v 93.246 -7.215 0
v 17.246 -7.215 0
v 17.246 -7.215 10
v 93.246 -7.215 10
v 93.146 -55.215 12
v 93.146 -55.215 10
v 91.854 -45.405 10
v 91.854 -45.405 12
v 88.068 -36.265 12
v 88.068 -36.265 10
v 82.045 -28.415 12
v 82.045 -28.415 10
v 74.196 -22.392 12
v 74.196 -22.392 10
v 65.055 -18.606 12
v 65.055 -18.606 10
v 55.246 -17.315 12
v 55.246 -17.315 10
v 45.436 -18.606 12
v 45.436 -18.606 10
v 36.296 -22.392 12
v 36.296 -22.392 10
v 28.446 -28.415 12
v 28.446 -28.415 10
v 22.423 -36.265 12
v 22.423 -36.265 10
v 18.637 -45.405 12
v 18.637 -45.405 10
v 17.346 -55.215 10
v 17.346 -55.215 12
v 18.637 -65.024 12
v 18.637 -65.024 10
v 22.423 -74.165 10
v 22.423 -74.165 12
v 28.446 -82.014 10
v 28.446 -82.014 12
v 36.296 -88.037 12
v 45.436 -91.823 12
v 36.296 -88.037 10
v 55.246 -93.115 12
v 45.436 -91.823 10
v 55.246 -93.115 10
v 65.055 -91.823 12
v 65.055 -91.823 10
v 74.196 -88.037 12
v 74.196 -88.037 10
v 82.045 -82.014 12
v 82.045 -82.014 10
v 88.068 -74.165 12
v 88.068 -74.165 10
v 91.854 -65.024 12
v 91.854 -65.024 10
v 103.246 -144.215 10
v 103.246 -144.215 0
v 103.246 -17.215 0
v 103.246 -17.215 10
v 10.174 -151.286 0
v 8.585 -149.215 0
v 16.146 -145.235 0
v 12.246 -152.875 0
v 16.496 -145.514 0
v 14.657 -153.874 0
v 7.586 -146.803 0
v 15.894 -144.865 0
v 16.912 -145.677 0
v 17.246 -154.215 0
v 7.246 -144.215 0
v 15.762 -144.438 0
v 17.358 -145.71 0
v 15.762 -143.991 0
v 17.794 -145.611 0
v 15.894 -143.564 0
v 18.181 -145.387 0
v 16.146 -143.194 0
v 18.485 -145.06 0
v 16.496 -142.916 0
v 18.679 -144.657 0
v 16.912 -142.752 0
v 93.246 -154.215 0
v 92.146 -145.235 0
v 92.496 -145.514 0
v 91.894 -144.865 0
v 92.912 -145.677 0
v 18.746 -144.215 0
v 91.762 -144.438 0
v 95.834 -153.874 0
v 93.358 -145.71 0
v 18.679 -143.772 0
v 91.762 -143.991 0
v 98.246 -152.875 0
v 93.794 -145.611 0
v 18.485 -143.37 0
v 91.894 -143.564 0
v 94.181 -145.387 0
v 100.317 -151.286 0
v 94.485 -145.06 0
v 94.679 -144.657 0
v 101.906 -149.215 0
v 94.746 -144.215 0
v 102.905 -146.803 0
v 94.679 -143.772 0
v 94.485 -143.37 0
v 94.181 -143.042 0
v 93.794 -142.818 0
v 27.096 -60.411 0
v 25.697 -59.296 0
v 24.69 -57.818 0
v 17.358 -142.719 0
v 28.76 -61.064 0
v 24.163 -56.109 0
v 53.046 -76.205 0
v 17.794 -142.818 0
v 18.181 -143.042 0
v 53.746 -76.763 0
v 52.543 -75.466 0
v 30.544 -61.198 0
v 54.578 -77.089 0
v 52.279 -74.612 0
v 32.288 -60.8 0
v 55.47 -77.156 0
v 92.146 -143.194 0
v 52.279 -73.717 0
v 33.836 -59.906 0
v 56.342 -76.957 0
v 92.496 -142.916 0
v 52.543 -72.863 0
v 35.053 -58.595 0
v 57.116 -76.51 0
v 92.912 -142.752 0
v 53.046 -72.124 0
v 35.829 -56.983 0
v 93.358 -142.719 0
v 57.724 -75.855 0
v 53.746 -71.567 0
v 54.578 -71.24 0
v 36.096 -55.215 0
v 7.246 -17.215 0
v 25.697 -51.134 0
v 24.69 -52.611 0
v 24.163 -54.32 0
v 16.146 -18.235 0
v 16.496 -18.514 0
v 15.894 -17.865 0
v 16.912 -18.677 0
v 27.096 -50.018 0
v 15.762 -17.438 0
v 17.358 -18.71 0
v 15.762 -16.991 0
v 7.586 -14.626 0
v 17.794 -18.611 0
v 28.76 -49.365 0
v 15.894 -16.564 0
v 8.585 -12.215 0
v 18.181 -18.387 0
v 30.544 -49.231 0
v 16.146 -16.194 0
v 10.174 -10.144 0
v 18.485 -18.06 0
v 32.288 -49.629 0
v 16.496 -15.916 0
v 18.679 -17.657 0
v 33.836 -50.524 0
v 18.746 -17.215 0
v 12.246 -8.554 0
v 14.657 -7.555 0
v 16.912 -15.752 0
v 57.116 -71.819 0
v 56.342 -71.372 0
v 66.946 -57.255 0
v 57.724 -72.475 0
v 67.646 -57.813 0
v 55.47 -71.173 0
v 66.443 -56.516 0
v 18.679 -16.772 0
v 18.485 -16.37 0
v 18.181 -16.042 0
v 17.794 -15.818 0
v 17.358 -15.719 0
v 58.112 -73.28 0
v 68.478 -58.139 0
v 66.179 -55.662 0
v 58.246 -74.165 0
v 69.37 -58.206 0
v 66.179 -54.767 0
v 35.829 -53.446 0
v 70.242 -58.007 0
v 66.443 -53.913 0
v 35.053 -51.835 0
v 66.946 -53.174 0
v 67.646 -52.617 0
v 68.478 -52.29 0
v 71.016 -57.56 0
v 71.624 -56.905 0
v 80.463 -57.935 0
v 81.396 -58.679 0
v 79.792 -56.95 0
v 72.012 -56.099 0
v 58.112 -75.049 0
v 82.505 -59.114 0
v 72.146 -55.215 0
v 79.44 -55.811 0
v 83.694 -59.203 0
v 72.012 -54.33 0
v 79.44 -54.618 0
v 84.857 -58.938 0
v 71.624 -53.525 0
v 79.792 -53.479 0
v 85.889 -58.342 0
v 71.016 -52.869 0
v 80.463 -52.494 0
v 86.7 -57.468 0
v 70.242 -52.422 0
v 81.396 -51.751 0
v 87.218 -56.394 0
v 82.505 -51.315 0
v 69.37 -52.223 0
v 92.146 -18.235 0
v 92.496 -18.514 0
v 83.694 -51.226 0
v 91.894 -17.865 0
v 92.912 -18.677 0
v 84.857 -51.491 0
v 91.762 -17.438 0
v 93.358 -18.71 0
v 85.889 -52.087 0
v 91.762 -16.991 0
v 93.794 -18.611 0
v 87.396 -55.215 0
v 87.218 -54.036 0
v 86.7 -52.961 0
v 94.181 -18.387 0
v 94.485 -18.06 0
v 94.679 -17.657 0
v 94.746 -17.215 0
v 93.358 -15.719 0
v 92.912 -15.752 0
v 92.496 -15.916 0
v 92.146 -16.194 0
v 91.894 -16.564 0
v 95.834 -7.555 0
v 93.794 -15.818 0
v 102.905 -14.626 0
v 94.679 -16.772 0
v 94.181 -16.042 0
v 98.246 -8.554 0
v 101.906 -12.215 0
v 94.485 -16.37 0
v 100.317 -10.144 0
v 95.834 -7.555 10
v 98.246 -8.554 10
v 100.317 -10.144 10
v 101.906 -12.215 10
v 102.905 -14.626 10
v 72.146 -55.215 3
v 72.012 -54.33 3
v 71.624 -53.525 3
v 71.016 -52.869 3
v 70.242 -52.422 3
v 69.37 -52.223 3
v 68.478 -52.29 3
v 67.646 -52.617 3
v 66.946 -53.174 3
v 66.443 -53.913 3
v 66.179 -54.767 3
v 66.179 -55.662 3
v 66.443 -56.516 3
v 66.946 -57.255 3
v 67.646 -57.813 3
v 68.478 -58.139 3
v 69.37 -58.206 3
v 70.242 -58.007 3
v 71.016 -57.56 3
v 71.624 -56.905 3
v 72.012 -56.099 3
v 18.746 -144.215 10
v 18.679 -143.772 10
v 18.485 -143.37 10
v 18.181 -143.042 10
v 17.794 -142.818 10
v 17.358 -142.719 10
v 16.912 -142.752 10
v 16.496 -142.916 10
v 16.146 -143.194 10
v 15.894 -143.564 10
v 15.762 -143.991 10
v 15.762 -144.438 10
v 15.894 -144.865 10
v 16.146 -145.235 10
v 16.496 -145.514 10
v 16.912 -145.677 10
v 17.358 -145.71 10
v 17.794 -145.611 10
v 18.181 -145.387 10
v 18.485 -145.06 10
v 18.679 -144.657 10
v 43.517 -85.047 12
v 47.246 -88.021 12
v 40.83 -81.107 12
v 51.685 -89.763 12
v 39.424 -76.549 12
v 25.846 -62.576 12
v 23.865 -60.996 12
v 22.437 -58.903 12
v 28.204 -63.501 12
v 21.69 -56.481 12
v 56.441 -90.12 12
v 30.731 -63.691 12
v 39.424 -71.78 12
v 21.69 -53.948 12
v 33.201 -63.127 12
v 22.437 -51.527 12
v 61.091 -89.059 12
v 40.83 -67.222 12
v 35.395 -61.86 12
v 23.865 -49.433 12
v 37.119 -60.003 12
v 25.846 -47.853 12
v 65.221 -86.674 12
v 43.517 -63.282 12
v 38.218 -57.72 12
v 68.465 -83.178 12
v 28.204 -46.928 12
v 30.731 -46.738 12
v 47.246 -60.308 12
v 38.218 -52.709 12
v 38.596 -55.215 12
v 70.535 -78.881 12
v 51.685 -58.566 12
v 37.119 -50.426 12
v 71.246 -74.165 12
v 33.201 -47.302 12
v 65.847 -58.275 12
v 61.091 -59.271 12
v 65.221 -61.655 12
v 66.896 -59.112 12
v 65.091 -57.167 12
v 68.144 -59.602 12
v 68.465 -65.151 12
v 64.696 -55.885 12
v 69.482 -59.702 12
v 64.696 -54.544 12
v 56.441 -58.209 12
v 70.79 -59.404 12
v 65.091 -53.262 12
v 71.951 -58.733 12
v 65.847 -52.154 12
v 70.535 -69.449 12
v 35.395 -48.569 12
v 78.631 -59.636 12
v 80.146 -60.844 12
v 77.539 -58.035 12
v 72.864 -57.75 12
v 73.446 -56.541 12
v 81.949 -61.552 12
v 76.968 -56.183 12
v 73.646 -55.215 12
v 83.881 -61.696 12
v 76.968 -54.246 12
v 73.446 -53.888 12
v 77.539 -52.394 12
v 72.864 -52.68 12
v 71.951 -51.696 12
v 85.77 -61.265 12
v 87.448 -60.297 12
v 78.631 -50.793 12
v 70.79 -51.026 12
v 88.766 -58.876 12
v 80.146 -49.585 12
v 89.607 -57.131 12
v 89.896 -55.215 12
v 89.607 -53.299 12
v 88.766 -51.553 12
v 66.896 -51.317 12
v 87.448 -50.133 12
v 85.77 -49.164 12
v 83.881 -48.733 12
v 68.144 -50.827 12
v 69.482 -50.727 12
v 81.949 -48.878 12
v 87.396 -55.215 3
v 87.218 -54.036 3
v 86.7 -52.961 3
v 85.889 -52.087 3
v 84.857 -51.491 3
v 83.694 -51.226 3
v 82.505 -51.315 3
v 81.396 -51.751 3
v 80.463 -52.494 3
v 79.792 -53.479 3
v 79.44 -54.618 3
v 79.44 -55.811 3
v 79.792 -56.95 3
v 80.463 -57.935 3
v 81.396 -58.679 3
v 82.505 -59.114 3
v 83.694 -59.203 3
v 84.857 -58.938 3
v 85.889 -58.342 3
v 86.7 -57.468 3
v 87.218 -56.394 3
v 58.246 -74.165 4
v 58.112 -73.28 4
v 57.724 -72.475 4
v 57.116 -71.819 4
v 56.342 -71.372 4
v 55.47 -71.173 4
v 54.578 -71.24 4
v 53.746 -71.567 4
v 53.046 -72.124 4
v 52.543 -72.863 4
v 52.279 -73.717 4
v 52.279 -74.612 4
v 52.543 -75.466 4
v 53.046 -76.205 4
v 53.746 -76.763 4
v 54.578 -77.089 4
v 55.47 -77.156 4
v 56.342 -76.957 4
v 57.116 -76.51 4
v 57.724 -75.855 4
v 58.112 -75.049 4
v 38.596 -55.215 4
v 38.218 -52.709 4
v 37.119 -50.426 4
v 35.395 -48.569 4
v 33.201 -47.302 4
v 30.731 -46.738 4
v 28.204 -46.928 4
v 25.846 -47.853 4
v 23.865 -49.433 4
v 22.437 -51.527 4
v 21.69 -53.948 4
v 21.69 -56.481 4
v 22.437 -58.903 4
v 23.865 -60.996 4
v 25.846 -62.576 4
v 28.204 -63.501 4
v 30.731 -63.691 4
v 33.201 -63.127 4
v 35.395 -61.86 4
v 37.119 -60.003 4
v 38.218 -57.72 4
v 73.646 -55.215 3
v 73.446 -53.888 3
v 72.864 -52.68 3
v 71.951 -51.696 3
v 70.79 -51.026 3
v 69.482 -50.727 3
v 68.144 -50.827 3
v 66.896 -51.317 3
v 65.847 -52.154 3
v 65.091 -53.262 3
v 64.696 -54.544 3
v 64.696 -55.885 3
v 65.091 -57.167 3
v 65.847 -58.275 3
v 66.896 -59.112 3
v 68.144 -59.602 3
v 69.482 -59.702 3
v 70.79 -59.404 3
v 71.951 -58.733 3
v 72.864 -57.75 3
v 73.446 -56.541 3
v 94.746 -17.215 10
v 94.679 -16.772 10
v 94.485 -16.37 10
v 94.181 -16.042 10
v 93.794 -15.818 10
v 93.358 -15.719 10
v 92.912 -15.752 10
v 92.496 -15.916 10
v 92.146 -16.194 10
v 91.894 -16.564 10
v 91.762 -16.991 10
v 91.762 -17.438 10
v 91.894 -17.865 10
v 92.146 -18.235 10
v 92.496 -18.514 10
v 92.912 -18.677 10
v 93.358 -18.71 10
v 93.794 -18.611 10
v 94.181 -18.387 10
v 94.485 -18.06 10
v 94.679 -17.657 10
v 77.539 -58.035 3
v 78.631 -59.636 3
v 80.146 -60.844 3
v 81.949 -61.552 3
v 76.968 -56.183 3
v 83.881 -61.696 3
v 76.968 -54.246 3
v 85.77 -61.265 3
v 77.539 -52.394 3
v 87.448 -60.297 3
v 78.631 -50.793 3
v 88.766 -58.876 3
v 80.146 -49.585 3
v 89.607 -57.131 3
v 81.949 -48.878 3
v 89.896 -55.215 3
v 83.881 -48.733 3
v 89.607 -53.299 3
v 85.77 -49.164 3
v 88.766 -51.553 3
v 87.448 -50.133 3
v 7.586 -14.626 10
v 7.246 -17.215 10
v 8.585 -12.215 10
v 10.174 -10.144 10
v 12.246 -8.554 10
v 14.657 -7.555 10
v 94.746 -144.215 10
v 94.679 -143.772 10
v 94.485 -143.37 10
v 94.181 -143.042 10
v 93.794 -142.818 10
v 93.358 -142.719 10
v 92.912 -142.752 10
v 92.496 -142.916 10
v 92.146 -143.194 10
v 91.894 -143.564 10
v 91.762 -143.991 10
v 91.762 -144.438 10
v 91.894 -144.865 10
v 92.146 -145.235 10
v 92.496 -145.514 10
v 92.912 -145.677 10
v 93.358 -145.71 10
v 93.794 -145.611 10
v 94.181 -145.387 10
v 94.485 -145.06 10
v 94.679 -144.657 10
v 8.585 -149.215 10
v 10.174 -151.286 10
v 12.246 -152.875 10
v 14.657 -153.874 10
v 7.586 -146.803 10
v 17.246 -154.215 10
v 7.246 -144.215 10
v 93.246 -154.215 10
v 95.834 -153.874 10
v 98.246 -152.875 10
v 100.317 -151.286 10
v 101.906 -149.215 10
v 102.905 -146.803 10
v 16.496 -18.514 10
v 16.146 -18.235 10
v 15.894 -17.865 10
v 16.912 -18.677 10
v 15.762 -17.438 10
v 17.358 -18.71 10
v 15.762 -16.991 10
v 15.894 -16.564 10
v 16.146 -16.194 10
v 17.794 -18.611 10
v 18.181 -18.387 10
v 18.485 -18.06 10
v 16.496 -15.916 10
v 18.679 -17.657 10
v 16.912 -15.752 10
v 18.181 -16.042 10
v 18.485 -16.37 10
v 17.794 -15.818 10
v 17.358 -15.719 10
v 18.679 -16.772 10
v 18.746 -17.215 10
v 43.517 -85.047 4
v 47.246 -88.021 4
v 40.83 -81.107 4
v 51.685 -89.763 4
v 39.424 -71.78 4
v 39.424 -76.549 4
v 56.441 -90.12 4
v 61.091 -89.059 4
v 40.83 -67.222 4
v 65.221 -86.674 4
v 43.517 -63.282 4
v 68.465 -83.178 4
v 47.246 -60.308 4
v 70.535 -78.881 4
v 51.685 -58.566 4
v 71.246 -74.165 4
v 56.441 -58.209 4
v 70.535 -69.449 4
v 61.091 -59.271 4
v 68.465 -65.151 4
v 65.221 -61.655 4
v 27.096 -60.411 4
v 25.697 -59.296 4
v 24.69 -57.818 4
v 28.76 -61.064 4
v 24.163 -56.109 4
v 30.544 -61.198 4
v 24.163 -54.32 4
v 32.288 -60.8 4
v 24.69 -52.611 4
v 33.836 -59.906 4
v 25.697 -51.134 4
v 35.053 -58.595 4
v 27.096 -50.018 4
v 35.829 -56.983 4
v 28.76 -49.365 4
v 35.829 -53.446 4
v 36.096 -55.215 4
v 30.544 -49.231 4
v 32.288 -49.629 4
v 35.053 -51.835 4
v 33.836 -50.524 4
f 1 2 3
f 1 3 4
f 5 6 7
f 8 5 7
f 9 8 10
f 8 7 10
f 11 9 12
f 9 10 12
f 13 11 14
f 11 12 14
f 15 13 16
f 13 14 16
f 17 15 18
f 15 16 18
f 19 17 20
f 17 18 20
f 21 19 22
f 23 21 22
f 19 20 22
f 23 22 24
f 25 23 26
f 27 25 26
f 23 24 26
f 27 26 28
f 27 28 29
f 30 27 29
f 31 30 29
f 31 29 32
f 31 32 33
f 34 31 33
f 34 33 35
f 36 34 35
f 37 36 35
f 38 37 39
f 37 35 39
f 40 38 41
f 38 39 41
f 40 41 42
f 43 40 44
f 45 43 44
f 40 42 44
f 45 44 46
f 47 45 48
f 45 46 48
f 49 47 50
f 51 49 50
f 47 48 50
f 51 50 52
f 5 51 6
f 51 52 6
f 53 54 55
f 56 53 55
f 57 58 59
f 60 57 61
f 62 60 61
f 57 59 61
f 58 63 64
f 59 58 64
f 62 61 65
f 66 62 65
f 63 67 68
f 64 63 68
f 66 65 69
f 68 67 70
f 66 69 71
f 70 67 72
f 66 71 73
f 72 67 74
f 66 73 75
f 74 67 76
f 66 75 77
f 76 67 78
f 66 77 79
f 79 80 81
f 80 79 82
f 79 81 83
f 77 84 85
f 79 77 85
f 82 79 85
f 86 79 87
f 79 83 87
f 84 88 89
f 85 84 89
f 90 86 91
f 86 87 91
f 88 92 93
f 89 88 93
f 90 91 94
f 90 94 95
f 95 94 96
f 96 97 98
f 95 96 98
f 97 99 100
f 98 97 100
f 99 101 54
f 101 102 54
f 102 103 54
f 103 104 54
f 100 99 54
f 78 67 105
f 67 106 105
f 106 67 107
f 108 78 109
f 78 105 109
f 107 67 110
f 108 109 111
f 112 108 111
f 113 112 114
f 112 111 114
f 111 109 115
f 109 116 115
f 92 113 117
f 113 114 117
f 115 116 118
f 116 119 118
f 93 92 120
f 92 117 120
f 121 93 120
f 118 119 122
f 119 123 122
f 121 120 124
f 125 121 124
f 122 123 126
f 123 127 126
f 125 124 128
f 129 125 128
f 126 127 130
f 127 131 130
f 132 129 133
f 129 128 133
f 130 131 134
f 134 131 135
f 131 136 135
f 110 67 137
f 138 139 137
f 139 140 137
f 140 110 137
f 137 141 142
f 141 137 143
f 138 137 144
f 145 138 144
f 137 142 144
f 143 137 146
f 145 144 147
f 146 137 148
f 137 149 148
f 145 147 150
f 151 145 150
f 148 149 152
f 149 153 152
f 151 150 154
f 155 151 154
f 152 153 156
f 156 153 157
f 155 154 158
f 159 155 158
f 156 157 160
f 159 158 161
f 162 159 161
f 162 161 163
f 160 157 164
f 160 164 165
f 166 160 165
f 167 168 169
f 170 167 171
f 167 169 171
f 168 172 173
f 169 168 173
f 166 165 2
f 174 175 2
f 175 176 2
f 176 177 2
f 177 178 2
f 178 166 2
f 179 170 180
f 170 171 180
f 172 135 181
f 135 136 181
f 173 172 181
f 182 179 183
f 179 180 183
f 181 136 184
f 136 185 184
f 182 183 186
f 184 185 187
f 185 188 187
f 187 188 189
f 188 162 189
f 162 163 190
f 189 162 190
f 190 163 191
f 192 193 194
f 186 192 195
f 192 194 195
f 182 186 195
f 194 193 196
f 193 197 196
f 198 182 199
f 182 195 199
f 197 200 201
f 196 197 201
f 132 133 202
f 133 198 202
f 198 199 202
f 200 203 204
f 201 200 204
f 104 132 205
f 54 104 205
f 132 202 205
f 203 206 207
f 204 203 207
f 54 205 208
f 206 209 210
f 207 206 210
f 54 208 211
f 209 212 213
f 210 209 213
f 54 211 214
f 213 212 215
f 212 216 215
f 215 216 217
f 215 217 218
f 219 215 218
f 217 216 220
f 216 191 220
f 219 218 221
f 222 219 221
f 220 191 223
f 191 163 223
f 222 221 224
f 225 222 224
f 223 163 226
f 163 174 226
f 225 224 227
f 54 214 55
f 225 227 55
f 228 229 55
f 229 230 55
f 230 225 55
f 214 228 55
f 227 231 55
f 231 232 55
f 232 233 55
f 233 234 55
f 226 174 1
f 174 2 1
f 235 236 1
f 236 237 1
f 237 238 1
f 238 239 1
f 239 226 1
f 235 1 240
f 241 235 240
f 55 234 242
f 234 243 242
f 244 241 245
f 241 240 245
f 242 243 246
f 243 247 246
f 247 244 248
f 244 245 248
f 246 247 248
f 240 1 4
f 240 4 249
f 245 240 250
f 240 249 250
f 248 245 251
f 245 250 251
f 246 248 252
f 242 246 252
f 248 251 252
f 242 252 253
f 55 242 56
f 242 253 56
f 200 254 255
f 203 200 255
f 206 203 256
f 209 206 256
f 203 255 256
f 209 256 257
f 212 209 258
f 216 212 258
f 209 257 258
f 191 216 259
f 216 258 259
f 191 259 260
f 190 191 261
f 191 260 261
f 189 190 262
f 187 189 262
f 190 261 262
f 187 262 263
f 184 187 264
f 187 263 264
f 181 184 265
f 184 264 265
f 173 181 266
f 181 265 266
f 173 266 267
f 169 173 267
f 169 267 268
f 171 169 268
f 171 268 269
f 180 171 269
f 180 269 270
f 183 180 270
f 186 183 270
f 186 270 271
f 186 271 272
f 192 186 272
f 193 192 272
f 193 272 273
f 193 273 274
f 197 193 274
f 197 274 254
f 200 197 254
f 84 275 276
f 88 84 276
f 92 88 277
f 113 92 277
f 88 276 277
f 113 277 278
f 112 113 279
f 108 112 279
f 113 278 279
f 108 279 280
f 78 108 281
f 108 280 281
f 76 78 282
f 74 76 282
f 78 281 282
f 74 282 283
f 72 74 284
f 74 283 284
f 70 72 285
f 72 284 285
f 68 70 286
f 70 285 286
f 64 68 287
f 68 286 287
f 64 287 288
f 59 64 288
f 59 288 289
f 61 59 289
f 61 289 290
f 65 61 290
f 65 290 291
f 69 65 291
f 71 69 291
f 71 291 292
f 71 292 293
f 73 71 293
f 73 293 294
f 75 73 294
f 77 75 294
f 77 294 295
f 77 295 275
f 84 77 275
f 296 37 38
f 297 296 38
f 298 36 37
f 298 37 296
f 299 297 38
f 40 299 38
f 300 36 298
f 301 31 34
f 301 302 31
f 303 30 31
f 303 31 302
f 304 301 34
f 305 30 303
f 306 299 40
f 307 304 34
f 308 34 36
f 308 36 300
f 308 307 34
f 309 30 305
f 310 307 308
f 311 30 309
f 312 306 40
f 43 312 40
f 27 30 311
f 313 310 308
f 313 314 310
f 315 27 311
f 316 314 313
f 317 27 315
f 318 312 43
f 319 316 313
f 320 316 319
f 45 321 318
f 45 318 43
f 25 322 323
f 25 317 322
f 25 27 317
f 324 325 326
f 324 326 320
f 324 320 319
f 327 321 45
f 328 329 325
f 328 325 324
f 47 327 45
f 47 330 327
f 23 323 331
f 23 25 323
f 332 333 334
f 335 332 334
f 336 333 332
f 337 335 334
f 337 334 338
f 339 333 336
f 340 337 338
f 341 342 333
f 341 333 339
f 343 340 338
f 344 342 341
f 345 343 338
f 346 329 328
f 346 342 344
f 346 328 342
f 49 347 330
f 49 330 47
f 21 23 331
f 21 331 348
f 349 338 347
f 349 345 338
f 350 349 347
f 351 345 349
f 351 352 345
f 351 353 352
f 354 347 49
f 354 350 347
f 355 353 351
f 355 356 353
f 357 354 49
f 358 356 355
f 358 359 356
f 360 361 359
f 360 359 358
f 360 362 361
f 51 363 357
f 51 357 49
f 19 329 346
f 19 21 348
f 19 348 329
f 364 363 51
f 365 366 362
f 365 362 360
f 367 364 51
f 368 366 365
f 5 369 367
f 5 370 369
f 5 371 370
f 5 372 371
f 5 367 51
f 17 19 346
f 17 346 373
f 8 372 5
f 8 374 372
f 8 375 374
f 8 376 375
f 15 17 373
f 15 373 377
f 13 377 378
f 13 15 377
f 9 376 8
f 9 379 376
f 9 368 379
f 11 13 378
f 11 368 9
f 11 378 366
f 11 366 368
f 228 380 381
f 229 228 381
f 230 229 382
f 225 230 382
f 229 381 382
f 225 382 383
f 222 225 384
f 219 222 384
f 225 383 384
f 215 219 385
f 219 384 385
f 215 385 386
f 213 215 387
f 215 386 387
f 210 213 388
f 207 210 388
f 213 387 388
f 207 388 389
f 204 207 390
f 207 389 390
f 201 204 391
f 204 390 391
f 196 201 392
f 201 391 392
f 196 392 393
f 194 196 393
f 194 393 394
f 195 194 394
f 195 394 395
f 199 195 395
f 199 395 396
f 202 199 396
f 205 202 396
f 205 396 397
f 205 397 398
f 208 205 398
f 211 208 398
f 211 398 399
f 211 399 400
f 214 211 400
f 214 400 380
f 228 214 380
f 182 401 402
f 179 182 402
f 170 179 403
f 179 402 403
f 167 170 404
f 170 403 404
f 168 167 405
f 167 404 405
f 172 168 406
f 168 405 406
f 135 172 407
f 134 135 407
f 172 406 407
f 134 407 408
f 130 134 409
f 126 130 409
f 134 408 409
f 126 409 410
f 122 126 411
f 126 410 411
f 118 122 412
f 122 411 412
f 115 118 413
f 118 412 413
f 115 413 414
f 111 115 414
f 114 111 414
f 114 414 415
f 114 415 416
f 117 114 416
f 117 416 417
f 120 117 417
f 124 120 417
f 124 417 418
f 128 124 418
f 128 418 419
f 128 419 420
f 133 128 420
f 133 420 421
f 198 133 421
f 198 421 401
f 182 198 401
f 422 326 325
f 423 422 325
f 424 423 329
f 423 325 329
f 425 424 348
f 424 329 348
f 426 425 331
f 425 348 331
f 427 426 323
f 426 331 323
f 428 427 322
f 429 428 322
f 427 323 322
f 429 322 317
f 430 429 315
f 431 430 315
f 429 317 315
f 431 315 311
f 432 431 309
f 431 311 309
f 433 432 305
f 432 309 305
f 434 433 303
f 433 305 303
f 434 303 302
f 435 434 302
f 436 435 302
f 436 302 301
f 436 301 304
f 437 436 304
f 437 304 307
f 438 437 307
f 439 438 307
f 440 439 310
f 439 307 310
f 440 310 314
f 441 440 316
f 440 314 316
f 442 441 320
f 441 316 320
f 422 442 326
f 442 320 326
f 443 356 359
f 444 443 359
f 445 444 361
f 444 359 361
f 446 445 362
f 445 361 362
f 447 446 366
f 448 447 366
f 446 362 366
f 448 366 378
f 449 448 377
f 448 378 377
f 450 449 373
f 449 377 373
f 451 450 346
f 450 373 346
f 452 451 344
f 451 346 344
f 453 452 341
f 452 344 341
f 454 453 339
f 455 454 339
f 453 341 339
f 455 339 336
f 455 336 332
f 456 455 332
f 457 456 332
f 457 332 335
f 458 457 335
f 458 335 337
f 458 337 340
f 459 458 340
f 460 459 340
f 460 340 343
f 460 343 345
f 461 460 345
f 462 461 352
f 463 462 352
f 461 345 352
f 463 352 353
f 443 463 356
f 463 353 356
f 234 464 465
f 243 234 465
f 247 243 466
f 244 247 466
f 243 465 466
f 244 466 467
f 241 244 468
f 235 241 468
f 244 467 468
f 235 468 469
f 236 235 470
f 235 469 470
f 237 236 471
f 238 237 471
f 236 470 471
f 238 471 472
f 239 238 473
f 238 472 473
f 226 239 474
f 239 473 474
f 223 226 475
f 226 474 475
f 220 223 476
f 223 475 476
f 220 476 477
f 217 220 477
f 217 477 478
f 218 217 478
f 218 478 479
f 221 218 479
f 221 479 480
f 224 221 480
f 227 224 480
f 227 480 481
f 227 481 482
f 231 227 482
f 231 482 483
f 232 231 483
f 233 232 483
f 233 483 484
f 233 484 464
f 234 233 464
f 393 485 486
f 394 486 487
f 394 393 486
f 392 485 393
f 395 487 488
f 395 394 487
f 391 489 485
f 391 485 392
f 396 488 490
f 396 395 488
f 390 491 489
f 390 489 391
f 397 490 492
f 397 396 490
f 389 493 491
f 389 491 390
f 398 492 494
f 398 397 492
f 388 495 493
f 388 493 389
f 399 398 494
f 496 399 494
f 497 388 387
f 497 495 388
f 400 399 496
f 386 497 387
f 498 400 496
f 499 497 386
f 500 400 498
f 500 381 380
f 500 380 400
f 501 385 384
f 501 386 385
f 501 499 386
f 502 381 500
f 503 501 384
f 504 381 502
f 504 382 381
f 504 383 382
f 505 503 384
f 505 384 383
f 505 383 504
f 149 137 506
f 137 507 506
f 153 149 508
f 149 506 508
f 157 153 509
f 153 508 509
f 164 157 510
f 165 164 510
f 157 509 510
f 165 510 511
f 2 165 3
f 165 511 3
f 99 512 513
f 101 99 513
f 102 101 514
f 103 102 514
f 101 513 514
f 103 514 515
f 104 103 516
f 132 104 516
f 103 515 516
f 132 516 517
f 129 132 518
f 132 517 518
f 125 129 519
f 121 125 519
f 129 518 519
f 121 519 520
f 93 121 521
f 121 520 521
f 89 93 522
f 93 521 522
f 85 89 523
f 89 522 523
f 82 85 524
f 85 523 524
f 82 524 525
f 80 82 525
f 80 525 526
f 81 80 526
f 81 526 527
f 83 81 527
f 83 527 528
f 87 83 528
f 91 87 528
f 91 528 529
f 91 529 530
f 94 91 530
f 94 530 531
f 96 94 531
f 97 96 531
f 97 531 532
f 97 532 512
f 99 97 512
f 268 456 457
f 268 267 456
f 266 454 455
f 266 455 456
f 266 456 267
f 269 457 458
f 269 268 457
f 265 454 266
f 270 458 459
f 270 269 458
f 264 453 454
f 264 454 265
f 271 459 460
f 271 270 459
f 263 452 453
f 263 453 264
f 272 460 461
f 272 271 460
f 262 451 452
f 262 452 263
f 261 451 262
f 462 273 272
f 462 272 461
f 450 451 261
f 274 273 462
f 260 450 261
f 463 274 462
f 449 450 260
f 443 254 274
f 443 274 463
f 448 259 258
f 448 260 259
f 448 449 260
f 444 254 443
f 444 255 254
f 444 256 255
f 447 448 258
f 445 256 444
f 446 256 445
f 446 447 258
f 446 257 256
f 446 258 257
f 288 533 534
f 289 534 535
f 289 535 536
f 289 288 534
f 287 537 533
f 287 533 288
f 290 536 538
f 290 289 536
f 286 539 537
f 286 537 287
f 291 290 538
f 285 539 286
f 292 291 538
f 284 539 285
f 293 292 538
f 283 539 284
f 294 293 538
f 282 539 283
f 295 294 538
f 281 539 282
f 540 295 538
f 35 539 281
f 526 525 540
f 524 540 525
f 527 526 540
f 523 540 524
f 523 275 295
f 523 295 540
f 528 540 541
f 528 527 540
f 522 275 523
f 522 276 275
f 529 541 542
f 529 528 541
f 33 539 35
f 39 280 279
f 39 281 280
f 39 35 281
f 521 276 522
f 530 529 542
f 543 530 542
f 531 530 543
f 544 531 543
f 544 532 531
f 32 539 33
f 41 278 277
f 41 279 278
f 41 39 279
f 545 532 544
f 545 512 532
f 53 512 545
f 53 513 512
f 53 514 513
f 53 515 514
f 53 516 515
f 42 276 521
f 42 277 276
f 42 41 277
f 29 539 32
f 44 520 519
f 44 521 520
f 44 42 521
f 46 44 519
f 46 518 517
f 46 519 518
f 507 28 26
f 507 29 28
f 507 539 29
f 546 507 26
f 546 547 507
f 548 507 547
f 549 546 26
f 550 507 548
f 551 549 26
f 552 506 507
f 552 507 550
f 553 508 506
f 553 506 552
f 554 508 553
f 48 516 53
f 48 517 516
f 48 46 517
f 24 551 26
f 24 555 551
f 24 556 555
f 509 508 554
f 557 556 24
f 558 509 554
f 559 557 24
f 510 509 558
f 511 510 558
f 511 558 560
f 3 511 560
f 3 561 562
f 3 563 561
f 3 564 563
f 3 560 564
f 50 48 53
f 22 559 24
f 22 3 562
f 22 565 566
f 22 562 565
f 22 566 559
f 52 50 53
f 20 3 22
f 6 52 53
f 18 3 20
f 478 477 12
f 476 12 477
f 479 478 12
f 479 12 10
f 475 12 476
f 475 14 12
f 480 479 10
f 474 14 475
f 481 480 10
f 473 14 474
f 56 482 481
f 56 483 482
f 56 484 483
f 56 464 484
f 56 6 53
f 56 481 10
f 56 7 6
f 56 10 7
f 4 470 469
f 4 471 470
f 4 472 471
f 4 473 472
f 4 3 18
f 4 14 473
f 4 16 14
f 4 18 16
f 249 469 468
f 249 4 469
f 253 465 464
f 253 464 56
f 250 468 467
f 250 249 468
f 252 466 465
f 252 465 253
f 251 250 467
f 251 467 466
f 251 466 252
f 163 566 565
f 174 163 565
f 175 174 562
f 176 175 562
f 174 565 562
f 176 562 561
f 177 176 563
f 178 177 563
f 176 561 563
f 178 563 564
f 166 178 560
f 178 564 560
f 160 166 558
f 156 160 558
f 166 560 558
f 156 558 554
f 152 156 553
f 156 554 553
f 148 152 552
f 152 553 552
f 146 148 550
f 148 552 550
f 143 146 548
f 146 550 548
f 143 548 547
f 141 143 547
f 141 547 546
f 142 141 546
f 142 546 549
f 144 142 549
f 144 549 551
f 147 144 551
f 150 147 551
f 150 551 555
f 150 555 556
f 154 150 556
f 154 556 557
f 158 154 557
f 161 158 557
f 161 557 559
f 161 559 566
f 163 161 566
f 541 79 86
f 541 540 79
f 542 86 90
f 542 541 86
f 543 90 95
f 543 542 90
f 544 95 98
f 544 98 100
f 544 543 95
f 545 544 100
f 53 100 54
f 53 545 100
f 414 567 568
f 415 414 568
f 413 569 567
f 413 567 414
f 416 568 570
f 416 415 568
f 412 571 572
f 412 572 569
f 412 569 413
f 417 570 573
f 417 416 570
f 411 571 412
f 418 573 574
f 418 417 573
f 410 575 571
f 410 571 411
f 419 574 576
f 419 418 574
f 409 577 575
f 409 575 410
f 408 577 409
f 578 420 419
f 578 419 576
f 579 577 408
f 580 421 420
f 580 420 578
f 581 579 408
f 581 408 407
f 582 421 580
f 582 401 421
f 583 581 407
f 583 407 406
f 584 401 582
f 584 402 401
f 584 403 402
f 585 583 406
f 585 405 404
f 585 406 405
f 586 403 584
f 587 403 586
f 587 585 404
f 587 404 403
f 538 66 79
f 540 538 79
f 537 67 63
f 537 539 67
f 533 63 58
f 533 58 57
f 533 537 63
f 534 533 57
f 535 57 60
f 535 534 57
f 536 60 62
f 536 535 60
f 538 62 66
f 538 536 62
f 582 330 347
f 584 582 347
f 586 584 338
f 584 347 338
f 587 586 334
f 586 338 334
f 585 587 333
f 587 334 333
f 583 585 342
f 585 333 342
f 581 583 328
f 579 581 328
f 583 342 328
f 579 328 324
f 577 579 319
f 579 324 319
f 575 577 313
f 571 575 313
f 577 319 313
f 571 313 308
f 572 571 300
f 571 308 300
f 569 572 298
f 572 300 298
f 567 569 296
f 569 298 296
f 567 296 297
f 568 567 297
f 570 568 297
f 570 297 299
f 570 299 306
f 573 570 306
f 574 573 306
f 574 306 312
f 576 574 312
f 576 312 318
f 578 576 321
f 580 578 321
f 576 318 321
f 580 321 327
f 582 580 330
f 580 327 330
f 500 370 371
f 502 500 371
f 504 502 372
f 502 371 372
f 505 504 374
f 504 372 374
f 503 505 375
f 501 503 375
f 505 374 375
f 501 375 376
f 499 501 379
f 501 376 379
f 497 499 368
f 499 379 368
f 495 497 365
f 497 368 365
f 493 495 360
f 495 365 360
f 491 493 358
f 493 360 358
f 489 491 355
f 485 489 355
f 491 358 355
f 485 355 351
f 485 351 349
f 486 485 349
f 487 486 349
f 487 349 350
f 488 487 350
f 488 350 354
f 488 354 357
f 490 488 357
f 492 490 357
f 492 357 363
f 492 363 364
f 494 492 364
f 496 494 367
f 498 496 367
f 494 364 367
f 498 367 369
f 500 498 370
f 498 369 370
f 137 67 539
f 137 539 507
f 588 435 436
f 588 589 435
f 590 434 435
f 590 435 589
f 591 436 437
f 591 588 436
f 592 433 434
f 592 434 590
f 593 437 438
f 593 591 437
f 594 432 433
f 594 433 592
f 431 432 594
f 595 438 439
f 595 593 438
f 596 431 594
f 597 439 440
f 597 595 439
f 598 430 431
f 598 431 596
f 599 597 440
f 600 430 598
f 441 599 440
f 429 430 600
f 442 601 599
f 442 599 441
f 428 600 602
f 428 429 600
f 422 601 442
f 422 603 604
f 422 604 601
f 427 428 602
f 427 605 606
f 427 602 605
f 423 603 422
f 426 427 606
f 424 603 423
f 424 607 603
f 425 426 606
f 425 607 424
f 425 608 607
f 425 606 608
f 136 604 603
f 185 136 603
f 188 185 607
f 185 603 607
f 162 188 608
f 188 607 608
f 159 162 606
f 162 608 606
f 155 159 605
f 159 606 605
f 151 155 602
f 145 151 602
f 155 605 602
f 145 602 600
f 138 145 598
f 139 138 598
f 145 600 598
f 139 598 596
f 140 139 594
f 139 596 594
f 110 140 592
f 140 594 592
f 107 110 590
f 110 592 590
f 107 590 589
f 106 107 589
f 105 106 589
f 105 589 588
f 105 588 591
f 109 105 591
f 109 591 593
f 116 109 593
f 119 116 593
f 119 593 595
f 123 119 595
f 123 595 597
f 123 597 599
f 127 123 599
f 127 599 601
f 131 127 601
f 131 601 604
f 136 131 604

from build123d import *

# Parameters (mm, degrees)
SKETCH037_W     = 96
SKETCH037_H     = 147
PAD011_DEPTH    = 10
SKETCH038_R     = 37.9
PAD012_DEPTH    = 2
SKETCH039_R     = 16
POCKET006_DEPTH = 8
SKETCH040_R     = 3
POCKET007_DEPTH = 4.001
SKETCH041_R     = 8.5
POCKET008_DEPTH = 8
SKETCH042_R     = 6
POCKET009_DEPTH = 4.001
SKETCH043_R     = 4.5
SKETCH043_R_2   = 6.5
POCKET010_DEPTH = 9
SKETCH044_R     = 4
SKETCH044_R_2   = 3
POCKET011_DEPTH = 3.001
SKETCH048_R     = 1.5
SKETCH048_R_2   = 1
POCKET012_DEPTH = 10.001
FILLET004_R     = 10


with BuildPart() as part:
    # Sketch037 → Pad011 (new body)
    with BuildSketch(Plane.XY):
        with Locations((-206.727857, -364.966475)):
            Rectangle(SKETCH037_W, SKETCH037_H)
    extrude(amount=PAD011_DEPTH)

    # Sketch038 (on Face6 of Pad011) → Pad012 (join)
    with BuildSketch(Plane.XY.offset(10)):
        with Locations((-206.727857, -339.466475)):
            Circle(SKETCH038_R)
    extrude(amount=PAD012_DEPTH)

    # Sketch039 (on Face8 of Pad012) → Pocket006 (cut)
    with BuildSketch(Plane.XY.offset(12)):
        with Locations((-206.727857, -358.416475)):
            Circle(SKETCH039_R)
    extrude(amount=-POCKET006_DEPTH, mode=Mode.SUBTRACT)

    # Sketch040 (on Face10 of Pocket006) → Pocket007 (cut, through all)
    with BuildSketch(Plane.XY.offset(4)):
        with Locations((-206.727857, -358.416475)):
            Circle(SKETCH040_R)
    extrude(amount=-POCKET007_DEPTH, mode=Mode.SUBTRACT)

    # Sketch041 (on Face8 of Pad012) → Pocket008 (cut)
    with BuildSketch(Plane.XY.offset(12)):
        with Locations((-231.877857, -339.466475)):
            Circle(SKETCH041_R)
    extrude(amount=-POCKET008_DEPTH, mode=Mode.SUBTRACT)

    # Sketch042 (on Face13 of Pocket008) → Pocket009 (cut, through all)
    with BuildSketch(Plane.XY.offset(4)):
        with Locations((-231.877857, -339.466475)):
            Circle(SKETCH042_R)
    extrude(amount=-POCKET009_DEPTH, mode=Mode.SUBTRACT)

    # Sketch043 (on Face8 of Pad012) → Pocket010 (cut)
    with BuildSketch(Plane.XY.offset(12)):
        with Locations((-192.827857, -339.466475)):
            Circle(SKETCH043_R)
        with Locations((-178.577857, -339.466475)):
            Circle(SKETCH043_R_2)
    extrude(amount=-POCKET010_DEPTH, mode=Mode.SUBTRACT)

    # Sketch044 (on Face18 of Pocket010) → Pocket011 (cut, through all)
    with BuildSketch(Plane.XY.offset(3)):
        with Locations((-178.577857, -339.466475)):
            Circle(SKETCH044_R)
        with Locations((-192.827857, -339.466475)):
            Circle(SKETCH044_R_2)
    extrude(amount=-POCKET011_DEPTH, mode=Mode.SUBTRACT)

    # Sketch048 (on Face5 of Pocket011) → Pocket012 (cut, through all)
    with BuildSketch(Plane.XY.offset(10)):
        with Locations((-244.727857, -301.466475)):
            Circle(SKETCH048_R)
        with Locations((-168.727857, -301.466475)):
            Circle(SKETCH048_R)
        with Locations((-168.727857, -428.466475)):
            Circle(SKETCH048_R)
        with Locations((-244.727857, -428.466475)):
            Circle(SKETCH048_R)
        with Locations((-214.611015, -276.454363)):
            Circle(SKETCH048_R_2)
        with Locations((-201.837814, -276.122591)):
            Circle(SKETCH048_R)
    extrude(amount=-POCKET012_DEPTH, mode=Mode.SUBTRACT)

    # Fillet004
    fillet004_edges = [part.edges().sort_by_distance(p)[0] for p in [
        (-254.727857, -438.466475, 5),
        (-158.727857, -438.466475, 5),
        (-254.727857, -291.466475, 5),
        (-158.727857, -291.466475, 5),
    ]]
    fillet(fillet004_edges, radius=FILLET004_R)


with BuildPart() as part_1:
    # Body010 placement: moved
    add(part.part.moved(Location((261.973389, 284.251869, 0))))


solid = part_1.part
